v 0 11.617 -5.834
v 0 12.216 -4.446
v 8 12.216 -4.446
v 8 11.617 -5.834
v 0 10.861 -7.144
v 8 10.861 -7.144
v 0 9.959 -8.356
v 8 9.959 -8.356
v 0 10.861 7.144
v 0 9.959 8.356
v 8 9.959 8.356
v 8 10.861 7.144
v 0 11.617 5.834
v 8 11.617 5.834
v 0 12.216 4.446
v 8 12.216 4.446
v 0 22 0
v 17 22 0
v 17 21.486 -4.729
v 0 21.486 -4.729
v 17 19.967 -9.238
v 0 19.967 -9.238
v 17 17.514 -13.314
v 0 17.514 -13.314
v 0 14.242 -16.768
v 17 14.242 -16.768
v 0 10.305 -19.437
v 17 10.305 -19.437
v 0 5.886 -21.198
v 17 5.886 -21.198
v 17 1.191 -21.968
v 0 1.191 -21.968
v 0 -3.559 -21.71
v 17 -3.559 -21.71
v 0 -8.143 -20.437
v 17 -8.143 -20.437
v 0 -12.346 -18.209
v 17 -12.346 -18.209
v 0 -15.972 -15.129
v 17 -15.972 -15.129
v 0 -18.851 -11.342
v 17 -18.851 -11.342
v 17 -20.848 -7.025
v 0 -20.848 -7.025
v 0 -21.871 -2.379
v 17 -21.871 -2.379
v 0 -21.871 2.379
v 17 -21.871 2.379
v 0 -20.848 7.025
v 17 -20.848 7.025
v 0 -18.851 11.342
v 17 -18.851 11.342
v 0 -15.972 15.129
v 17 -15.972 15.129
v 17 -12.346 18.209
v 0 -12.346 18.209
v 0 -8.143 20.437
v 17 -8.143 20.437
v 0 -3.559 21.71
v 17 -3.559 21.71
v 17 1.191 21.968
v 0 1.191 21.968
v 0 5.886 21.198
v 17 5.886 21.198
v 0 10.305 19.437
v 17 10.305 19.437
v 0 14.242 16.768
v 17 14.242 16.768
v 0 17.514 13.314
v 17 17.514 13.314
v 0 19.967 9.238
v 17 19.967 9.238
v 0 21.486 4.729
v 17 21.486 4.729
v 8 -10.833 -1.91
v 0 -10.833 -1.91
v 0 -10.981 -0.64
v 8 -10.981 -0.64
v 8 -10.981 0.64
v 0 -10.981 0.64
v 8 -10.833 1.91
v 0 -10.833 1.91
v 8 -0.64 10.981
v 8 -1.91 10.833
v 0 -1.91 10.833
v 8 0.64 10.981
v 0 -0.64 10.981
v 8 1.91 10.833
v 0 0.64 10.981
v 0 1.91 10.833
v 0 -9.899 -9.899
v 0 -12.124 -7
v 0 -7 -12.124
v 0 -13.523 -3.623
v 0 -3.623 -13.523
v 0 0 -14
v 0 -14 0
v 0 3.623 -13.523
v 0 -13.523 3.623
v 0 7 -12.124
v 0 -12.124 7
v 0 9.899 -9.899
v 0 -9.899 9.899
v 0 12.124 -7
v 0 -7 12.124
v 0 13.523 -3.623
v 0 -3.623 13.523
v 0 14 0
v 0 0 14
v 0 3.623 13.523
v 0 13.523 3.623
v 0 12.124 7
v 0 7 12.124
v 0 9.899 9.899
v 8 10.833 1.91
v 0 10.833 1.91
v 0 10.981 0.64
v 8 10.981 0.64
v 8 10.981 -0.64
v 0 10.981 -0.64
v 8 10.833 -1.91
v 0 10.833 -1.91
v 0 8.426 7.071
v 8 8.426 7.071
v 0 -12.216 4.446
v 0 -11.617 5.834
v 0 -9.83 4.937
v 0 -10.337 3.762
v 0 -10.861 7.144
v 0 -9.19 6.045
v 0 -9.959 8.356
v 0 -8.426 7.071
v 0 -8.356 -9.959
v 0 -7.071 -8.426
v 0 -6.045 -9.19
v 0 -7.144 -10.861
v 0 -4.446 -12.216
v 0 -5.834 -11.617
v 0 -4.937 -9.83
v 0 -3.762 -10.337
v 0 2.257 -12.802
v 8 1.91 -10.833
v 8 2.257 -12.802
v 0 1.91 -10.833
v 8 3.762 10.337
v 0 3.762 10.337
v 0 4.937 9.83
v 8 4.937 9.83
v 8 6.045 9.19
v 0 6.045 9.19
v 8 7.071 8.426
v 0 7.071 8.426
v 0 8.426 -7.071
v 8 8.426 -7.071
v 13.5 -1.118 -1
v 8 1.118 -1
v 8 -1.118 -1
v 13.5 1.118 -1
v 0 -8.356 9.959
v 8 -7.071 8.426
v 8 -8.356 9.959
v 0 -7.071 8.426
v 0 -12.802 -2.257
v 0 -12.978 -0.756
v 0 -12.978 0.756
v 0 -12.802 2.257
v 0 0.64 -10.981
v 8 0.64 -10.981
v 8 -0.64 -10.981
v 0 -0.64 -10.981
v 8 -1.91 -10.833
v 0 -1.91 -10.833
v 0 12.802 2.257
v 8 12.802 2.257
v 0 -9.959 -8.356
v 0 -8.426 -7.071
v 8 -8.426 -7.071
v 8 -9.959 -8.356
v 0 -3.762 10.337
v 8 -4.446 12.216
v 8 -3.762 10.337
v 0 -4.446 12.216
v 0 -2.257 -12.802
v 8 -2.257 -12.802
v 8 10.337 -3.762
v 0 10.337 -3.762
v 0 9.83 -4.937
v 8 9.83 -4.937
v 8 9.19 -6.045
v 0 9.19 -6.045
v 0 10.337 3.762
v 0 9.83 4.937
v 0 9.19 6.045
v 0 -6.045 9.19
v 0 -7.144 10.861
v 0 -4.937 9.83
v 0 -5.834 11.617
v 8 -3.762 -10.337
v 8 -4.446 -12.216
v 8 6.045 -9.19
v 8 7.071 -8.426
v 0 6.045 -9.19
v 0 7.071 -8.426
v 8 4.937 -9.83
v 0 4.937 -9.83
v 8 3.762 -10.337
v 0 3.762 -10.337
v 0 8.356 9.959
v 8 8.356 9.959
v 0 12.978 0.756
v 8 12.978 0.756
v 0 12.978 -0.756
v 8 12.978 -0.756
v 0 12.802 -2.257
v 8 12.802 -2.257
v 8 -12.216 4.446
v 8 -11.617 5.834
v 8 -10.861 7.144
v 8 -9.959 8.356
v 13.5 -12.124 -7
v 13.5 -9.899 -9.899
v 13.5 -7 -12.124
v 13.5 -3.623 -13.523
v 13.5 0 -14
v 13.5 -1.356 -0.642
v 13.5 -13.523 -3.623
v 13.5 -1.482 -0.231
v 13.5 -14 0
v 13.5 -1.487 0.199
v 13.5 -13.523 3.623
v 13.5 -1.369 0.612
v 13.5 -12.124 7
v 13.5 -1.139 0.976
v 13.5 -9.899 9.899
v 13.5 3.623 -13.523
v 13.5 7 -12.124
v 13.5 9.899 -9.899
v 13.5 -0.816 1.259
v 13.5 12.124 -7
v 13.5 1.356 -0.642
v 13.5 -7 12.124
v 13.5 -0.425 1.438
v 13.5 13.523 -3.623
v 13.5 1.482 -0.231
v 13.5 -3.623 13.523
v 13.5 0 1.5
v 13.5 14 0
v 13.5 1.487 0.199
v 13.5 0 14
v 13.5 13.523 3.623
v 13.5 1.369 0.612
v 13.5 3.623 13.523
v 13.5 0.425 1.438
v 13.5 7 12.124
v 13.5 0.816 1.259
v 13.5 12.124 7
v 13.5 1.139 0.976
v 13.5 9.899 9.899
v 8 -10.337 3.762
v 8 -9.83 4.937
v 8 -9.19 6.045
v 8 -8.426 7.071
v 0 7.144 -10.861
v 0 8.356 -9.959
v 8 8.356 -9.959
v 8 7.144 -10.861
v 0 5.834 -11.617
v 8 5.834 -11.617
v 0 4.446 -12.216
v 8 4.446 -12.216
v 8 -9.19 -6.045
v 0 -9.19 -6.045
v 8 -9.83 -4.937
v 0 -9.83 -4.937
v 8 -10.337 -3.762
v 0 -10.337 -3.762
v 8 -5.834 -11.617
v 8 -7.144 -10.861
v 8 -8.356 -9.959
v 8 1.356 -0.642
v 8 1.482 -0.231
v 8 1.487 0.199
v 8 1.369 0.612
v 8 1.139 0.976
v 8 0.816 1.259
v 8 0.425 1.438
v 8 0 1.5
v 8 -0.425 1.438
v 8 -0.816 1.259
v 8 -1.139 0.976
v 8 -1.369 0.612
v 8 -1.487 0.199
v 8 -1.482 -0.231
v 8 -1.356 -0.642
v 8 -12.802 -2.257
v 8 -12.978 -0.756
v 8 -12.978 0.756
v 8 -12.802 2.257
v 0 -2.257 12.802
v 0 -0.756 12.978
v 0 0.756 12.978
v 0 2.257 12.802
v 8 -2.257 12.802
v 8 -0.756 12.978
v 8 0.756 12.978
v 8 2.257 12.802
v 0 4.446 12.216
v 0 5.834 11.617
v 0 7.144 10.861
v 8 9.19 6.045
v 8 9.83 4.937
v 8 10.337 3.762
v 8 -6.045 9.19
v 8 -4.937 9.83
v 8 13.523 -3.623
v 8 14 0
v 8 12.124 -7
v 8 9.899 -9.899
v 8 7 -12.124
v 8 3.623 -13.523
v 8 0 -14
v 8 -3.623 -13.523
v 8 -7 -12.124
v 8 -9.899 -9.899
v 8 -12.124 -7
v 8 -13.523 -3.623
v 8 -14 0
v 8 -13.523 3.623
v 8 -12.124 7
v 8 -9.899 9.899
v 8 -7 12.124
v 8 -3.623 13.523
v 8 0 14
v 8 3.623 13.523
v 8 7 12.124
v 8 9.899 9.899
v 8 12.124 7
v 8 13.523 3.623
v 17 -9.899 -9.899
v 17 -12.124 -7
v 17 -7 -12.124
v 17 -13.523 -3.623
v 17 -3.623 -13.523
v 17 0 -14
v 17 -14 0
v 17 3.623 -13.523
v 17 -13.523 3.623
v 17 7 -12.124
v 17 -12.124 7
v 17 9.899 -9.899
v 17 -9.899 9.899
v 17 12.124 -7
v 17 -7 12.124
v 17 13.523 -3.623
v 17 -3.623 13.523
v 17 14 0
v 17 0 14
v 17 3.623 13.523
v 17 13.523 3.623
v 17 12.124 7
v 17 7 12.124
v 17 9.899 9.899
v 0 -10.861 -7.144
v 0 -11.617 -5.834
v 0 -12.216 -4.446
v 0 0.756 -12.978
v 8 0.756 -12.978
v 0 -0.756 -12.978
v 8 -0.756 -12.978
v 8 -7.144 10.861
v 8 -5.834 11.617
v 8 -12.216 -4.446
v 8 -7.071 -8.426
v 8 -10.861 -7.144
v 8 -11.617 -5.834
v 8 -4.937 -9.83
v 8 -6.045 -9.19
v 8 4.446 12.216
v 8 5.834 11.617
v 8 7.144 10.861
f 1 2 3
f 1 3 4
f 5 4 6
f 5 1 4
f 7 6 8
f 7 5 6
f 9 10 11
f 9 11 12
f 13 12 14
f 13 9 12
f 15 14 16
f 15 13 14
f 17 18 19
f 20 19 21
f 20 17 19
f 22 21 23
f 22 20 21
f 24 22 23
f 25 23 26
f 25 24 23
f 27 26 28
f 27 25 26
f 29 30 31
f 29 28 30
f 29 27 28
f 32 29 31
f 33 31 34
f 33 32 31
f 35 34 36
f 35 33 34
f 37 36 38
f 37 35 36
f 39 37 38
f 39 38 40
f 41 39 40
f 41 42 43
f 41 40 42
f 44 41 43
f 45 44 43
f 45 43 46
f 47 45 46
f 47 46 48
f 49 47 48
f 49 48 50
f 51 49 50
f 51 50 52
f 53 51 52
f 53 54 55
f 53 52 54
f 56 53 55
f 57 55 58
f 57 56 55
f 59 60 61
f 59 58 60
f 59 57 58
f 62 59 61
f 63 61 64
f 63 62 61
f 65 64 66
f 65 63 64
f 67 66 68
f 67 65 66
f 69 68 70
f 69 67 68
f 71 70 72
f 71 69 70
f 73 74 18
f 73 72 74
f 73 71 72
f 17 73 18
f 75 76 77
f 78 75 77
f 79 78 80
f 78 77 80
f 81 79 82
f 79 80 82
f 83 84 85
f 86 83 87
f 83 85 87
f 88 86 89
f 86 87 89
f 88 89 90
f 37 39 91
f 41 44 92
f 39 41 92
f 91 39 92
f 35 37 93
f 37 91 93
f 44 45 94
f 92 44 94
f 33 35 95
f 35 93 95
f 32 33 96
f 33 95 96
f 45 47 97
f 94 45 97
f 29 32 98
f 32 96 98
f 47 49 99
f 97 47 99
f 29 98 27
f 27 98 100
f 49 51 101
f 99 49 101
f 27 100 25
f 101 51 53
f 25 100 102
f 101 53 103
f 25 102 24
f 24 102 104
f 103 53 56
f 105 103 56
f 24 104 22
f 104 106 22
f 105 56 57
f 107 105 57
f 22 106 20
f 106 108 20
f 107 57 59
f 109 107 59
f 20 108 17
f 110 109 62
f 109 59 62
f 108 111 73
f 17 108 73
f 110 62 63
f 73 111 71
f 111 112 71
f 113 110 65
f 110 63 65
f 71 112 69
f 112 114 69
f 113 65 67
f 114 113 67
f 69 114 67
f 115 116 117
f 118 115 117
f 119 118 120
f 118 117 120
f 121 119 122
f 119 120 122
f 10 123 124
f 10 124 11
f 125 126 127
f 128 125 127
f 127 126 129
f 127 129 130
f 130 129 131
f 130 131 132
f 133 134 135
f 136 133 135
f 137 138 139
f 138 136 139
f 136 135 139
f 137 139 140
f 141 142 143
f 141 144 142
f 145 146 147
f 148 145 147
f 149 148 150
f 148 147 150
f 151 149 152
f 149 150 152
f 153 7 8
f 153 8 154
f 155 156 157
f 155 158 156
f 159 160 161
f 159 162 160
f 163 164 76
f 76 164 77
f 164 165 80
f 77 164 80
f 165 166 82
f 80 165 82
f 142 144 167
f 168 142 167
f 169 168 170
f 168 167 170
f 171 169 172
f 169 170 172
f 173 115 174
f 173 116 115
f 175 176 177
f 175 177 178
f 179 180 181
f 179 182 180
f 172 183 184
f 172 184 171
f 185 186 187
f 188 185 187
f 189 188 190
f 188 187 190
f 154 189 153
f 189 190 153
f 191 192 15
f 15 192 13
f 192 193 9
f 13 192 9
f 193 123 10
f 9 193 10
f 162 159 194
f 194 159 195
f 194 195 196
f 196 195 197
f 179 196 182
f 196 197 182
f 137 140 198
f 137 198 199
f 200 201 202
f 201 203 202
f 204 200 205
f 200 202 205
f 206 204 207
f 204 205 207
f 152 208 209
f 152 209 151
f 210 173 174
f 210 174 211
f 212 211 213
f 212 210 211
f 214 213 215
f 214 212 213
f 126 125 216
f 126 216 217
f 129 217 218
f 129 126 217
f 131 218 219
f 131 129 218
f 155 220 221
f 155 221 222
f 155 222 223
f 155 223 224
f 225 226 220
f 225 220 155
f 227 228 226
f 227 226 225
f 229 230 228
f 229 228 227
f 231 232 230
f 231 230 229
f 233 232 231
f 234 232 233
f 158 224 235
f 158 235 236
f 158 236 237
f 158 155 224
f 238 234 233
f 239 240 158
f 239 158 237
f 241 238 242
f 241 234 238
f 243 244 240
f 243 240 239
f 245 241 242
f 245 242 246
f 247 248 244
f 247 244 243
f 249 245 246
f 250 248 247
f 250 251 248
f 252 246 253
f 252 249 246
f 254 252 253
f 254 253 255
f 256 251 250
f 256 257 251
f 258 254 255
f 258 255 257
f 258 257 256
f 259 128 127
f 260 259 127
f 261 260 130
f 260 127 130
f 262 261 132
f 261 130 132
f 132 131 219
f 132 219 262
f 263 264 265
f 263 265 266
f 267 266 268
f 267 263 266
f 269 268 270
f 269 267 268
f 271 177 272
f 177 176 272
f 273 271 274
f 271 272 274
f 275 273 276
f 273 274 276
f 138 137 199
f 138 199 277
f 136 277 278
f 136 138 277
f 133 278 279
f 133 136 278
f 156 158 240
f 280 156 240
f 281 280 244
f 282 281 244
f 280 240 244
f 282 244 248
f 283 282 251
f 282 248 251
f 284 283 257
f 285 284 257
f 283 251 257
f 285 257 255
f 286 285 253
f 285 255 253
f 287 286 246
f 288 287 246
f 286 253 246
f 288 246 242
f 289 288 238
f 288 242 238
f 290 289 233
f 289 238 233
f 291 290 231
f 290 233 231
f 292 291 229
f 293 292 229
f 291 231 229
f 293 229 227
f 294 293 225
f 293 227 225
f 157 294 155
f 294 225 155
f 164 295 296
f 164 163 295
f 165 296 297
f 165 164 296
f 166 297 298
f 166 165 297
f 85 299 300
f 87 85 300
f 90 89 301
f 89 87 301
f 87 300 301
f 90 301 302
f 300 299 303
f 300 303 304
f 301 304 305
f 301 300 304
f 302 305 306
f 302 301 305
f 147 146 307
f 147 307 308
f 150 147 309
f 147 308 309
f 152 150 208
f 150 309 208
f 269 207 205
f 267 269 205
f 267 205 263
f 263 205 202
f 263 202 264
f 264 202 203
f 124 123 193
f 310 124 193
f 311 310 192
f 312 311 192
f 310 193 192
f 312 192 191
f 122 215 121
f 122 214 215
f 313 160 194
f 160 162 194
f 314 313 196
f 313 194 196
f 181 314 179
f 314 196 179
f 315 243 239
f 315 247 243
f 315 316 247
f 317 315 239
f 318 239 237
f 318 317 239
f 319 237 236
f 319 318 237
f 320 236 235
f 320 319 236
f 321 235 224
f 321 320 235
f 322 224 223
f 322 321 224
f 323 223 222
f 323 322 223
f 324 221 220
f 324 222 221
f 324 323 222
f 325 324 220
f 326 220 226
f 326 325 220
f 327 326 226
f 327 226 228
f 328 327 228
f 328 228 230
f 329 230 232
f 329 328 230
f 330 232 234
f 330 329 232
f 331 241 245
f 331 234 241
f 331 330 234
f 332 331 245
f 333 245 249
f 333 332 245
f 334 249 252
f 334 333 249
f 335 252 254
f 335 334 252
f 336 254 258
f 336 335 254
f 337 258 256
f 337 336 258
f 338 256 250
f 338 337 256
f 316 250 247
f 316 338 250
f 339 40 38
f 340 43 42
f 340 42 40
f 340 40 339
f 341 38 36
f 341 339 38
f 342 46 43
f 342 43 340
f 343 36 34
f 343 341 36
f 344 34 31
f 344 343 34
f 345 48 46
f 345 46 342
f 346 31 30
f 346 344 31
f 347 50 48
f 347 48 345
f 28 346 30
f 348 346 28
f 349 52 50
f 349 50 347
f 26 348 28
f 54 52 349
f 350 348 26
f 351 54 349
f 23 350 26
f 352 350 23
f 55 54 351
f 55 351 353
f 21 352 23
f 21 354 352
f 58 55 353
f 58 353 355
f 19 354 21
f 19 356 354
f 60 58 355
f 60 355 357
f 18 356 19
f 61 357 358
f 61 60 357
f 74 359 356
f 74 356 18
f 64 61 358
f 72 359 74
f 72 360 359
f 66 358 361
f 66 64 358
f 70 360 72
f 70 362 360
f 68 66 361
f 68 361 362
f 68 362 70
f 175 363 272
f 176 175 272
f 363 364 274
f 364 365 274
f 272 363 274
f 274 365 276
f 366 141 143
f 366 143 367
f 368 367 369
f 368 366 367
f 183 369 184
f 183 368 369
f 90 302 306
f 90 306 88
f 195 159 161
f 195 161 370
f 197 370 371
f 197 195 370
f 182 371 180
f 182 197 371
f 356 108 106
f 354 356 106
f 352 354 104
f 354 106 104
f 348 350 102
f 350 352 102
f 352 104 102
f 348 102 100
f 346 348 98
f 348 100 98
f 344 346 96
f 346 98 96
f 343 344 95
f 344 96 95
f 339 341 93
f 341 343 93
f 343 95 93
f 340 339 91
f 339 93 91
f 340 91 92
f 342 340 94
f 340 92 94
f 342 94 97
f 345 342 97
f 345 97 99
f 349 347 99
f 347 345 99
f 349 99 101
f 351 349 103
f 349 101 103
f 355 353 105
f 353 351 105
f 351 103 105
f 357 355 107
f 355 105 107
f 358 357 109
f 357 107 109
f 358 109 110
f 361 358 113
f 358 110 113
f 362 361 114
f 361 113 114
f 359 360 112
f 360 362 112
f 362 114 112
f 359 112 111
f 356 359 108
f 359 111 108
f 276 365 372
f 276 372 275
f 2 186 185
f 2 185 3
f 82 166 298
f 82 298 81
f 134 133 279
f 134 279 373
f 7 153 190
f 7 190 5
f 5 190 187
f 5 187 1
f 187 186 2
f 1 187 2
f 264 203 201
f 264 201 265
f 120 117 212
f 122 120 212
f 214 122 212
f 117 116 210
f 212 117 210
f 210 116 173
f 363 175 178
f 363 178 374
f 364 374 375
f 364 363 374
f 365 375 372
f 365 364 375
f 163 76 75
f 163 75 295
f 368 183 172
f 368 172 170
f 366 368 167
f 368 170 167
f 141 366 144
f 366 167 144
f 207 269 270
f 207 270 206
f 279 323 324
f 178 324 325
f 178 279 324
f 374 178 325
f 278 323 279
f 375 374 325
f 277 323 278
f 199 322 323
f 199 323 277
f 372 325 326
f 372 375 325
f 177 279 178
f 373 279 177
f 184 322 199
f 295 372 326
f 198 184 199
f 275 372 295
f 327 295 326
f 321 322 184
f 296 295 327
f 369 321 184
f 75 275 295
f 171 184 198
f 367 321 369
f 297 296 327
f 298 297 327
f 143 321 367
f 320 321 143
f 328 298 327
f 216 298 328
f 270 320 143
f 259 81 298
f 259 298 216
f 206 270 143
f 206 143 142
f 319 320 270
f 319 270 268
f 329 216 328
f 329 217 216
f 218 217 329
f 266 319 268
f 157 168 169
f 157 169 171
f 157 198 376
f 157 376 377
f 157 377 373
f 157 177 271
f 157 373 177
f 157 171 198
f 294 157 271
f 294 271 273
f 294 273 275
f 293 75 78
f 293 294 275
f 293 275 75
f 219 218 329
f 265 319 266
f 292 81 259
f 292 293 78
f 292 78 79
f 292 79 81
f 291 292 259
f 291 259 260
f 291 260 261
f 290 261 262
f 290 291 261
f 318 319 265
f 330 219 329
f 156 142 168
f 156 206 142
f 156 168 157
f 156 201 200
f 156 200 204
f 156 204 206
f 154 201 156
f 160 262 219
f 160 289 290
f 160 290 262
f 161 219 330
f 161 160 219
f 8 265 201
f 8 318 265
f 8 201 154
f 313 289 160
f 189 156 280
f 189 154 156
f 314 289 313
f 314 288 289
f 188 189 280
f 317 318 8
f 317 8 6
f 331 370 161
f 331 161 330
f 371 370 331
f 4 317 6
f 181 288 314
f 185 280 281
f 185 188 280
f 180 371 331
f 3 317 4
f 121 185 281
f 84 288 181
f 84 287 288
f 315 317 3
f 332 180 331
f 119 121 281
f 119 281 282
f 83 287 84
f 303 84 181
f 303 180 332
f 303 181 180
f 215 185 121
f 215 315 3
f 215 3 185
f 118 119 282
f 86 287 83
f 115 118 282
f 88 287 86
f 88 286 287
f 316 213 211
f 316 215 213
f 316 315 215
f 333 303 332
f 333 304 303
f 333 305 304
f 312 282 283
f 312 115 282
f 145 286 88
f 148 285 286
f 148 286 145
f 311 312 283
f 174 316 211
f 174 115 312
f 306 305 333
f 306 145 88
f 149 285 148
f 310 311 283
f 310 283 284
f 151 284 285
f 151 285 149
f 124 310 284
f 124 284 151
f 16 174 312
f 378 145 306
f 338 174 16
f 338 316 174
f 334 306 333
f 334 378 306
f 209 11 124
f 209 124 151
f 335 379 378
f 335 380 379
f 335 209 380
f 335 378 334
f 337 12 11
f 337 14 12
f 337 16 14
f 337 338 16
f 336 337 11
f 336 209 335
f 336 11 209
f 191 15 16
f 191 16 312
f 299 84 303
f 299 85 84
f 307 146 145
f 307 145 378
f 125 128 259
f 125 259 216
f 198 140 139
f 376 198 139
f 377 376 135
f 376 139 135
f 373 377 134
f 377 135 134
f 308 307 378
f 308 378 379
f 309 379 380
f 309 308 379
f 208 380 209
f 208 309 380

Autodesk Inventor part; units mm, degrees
ref_plane "YZ Plane" through (0, 0, 0) normal (1, 0, 0) x (0, 1, 0)
ref_plane "XZ Plane" through (0, 0, 0) normal (0, 1, 0) x (-1, 0, 0)
ref_plane "XY Plane" through (0, 0, 0) normal (0, 0, 1) x (1, 0, 0)
sketch "Sketch1" plane through (0, 0, 0) normal (1, 0, 0) x (0, 1, 0)
  circle A0 centre (0, 0) radius 22
  circle A1 centre (0, 0) radius 14
  dimension "d0" = 44
  dimension "d1" = 8
extrude "Extrusion1" add sketch "Sketch1" along normal blind 17
extrude "Extrusion2" add sketch "Sketch1" along normal blind 13.5 separate body contours A1
sketch "Sketch2" plane through (0, 0, 0) normal (-1, 0, 0) x (0, 0, 1)
  circle A0 centre (0, 0) radius 11
  circle A1 centre (0, 0) radius 13
  circle A2 centre (0, 0) radius 14 projected
  line L0 (0, 0) -> (2.2574, 12.8025) construction
  line L1 (0, 0) -> (0, 13)
  line L2 (0, 0) -> (-2.2574, 12.8025) construction
  line L3 (-2.2574, 12.8025) -> (-1.9101, 10.8329)
  line L4 (1.9101, 10.8329) -> (2.2574, 12.8025)
  line L5 (-3.7622, 10.3366) -> (-4.4463, 12.216)
  line L6 (-8.3562, 9.9586) -> (-7.0707, 8.4265)
  line L7 (-8.4265, 7.0707) -> (-9.9586, 8.3562)
  line L8 (-12.216, 4.4463) -> (-10.3366, 3.7622)
  line L9 (-10.8329, 1.9101) -> (-12.8025, 2.2574)
  line L10 (-12.8025, -2.2574) -> (-10.8329, -1.9101)
  line L11 (-10.3366, -3.7622) -> (-12.216, -4.4463)
  line L12 (-9.9586, -8.3562) -> (-8.4265, -7.0707)
  line L13 (-7.0707, -8.4265) -> (-8.3562, -9.9586)
  line L14 (-4.4463, -12.216) -> (-3.7622, -10.3366)
  line L15 (-1.9101, -10.8329) -> (-2.2574, -12.8025)
  line L16 (2.2574, -12.8025) -> (1.9101, -10.8329)
  line L17 (3.7622, -10.3366) -> (4.4463, -12.216)
  line L18 (8.3562, -9.9586) -> (7.0707, -8.4265)
  line L19 (8.4265, -7.0707) -> (9.9586, -8.3562)
  line L20 (12.216, -4.4463) -> (10.3366, -3.7622)
  line L21 (10.8329, -1.9101) -> (12.8025, -2.2574)
  line L22 (12.8025, 2.2574) -> (10.8329, 1.9101)
  line L23 (10.3366, 3.7622) -> (12.216, 4.4463)
  line L24 (9.9586, 8.3562) -> (8.4265, 7.0707)
  line L25 (7.0707, 8.4265) -> (8.3562, 9.9586)
  line L26 (4.4463, 12.216) -> (3.7622, 10.3366)
  point P0 (-4.4463, 12.216)
  point P1 (-3.7622, 10.3366)
  point P2 (-7.0707, 8.4265)
  point P3 (-8.4265, 7.0707)
  point P4 (-10.3366, 3.7622)
  point P5 (-12.216, 4.4463)
  point P6 (-12.8025, 2.2574)
  point P7 (-10.8329, 1.9101)
  point P8 (-10.8329, -1.9101)
  point P9 (-12.216, -4.4463)
  point P10 (-10.3366, -3.7622)
  point P11 (-8.4265, -7.0707)
  point P12 (-9.9586, -8.3562)
  point P13 (-8.3562, -9.9586)
  point P14 (-7.0707, -8.4265)
  point P15 (-3.7622, -10.3366)
  point P16 (-1.9101, -10.8329)
  point P17 (1.9101, -10.8329)
  point P18 (2.2574, -12.8025)
  point P19 (4.4463, -12.216)
  point P20 (7.0707, -8.4265)
  point P21 (8.3562, -9.9586)
  point P22 (9.9586, -8.3562)
  point P23 (8.4265, -7.0707)
  point P24 (10.3366, -3.7622)
  point P25 (12.216, -4.4463)
  point P26 (12.8025, -2.2574)
  point P27 (10.8329, -1.9101)
  point P28 (10.8329, 1.9101)
  point P29 (12.216, 4.4463)
  point P30 (8.4265, 7.0707)
  point P31 (9.9586, 8.3562)
  point P32 (8.3562, 9.9586)
  point P33 (3.7622, 10.3366)
  dimension "d7" = 2
  dimension "d6" = 1
  dimension "d8" = 10
  dimension "d9" = 3.8203
  dimension "d12" = 360
extrude "Extrusion3" cut sketch "Sketch2" against normal blind 8 contours A0 | A0 L23 A1 L22 | L21 A1 L20 A0 | A0 L25 A1 L24 | L19 A1 L18 A0 | A0 L4 A1 L26 | L17 A1 L16 A0 | L15 A1 L14 A0 | A0 L5 A1 L3 | L13 A1 L12 A0 | A0 L7 A1 L6 | L11 A1 L10 A0 | A0 L9 A1 L8 | A2 bodies 2
sketch "Sketch3" plane through (13.5, 0, 0) normal (1, 0, 0) x (0, 0, -1)
  circle A0 centre (0, 0) radius 1.5
  line L0 (1, 1.118) -> (1, -1.118)
  dimension "d16" = 3
  dimension "d17" = 1
extrude "Extrusion4" cut sketch "Sketch3" against normal through all contours L0 A0 picked at (0.1703, -0.0604) bodies 2
properties part number "llanta"
